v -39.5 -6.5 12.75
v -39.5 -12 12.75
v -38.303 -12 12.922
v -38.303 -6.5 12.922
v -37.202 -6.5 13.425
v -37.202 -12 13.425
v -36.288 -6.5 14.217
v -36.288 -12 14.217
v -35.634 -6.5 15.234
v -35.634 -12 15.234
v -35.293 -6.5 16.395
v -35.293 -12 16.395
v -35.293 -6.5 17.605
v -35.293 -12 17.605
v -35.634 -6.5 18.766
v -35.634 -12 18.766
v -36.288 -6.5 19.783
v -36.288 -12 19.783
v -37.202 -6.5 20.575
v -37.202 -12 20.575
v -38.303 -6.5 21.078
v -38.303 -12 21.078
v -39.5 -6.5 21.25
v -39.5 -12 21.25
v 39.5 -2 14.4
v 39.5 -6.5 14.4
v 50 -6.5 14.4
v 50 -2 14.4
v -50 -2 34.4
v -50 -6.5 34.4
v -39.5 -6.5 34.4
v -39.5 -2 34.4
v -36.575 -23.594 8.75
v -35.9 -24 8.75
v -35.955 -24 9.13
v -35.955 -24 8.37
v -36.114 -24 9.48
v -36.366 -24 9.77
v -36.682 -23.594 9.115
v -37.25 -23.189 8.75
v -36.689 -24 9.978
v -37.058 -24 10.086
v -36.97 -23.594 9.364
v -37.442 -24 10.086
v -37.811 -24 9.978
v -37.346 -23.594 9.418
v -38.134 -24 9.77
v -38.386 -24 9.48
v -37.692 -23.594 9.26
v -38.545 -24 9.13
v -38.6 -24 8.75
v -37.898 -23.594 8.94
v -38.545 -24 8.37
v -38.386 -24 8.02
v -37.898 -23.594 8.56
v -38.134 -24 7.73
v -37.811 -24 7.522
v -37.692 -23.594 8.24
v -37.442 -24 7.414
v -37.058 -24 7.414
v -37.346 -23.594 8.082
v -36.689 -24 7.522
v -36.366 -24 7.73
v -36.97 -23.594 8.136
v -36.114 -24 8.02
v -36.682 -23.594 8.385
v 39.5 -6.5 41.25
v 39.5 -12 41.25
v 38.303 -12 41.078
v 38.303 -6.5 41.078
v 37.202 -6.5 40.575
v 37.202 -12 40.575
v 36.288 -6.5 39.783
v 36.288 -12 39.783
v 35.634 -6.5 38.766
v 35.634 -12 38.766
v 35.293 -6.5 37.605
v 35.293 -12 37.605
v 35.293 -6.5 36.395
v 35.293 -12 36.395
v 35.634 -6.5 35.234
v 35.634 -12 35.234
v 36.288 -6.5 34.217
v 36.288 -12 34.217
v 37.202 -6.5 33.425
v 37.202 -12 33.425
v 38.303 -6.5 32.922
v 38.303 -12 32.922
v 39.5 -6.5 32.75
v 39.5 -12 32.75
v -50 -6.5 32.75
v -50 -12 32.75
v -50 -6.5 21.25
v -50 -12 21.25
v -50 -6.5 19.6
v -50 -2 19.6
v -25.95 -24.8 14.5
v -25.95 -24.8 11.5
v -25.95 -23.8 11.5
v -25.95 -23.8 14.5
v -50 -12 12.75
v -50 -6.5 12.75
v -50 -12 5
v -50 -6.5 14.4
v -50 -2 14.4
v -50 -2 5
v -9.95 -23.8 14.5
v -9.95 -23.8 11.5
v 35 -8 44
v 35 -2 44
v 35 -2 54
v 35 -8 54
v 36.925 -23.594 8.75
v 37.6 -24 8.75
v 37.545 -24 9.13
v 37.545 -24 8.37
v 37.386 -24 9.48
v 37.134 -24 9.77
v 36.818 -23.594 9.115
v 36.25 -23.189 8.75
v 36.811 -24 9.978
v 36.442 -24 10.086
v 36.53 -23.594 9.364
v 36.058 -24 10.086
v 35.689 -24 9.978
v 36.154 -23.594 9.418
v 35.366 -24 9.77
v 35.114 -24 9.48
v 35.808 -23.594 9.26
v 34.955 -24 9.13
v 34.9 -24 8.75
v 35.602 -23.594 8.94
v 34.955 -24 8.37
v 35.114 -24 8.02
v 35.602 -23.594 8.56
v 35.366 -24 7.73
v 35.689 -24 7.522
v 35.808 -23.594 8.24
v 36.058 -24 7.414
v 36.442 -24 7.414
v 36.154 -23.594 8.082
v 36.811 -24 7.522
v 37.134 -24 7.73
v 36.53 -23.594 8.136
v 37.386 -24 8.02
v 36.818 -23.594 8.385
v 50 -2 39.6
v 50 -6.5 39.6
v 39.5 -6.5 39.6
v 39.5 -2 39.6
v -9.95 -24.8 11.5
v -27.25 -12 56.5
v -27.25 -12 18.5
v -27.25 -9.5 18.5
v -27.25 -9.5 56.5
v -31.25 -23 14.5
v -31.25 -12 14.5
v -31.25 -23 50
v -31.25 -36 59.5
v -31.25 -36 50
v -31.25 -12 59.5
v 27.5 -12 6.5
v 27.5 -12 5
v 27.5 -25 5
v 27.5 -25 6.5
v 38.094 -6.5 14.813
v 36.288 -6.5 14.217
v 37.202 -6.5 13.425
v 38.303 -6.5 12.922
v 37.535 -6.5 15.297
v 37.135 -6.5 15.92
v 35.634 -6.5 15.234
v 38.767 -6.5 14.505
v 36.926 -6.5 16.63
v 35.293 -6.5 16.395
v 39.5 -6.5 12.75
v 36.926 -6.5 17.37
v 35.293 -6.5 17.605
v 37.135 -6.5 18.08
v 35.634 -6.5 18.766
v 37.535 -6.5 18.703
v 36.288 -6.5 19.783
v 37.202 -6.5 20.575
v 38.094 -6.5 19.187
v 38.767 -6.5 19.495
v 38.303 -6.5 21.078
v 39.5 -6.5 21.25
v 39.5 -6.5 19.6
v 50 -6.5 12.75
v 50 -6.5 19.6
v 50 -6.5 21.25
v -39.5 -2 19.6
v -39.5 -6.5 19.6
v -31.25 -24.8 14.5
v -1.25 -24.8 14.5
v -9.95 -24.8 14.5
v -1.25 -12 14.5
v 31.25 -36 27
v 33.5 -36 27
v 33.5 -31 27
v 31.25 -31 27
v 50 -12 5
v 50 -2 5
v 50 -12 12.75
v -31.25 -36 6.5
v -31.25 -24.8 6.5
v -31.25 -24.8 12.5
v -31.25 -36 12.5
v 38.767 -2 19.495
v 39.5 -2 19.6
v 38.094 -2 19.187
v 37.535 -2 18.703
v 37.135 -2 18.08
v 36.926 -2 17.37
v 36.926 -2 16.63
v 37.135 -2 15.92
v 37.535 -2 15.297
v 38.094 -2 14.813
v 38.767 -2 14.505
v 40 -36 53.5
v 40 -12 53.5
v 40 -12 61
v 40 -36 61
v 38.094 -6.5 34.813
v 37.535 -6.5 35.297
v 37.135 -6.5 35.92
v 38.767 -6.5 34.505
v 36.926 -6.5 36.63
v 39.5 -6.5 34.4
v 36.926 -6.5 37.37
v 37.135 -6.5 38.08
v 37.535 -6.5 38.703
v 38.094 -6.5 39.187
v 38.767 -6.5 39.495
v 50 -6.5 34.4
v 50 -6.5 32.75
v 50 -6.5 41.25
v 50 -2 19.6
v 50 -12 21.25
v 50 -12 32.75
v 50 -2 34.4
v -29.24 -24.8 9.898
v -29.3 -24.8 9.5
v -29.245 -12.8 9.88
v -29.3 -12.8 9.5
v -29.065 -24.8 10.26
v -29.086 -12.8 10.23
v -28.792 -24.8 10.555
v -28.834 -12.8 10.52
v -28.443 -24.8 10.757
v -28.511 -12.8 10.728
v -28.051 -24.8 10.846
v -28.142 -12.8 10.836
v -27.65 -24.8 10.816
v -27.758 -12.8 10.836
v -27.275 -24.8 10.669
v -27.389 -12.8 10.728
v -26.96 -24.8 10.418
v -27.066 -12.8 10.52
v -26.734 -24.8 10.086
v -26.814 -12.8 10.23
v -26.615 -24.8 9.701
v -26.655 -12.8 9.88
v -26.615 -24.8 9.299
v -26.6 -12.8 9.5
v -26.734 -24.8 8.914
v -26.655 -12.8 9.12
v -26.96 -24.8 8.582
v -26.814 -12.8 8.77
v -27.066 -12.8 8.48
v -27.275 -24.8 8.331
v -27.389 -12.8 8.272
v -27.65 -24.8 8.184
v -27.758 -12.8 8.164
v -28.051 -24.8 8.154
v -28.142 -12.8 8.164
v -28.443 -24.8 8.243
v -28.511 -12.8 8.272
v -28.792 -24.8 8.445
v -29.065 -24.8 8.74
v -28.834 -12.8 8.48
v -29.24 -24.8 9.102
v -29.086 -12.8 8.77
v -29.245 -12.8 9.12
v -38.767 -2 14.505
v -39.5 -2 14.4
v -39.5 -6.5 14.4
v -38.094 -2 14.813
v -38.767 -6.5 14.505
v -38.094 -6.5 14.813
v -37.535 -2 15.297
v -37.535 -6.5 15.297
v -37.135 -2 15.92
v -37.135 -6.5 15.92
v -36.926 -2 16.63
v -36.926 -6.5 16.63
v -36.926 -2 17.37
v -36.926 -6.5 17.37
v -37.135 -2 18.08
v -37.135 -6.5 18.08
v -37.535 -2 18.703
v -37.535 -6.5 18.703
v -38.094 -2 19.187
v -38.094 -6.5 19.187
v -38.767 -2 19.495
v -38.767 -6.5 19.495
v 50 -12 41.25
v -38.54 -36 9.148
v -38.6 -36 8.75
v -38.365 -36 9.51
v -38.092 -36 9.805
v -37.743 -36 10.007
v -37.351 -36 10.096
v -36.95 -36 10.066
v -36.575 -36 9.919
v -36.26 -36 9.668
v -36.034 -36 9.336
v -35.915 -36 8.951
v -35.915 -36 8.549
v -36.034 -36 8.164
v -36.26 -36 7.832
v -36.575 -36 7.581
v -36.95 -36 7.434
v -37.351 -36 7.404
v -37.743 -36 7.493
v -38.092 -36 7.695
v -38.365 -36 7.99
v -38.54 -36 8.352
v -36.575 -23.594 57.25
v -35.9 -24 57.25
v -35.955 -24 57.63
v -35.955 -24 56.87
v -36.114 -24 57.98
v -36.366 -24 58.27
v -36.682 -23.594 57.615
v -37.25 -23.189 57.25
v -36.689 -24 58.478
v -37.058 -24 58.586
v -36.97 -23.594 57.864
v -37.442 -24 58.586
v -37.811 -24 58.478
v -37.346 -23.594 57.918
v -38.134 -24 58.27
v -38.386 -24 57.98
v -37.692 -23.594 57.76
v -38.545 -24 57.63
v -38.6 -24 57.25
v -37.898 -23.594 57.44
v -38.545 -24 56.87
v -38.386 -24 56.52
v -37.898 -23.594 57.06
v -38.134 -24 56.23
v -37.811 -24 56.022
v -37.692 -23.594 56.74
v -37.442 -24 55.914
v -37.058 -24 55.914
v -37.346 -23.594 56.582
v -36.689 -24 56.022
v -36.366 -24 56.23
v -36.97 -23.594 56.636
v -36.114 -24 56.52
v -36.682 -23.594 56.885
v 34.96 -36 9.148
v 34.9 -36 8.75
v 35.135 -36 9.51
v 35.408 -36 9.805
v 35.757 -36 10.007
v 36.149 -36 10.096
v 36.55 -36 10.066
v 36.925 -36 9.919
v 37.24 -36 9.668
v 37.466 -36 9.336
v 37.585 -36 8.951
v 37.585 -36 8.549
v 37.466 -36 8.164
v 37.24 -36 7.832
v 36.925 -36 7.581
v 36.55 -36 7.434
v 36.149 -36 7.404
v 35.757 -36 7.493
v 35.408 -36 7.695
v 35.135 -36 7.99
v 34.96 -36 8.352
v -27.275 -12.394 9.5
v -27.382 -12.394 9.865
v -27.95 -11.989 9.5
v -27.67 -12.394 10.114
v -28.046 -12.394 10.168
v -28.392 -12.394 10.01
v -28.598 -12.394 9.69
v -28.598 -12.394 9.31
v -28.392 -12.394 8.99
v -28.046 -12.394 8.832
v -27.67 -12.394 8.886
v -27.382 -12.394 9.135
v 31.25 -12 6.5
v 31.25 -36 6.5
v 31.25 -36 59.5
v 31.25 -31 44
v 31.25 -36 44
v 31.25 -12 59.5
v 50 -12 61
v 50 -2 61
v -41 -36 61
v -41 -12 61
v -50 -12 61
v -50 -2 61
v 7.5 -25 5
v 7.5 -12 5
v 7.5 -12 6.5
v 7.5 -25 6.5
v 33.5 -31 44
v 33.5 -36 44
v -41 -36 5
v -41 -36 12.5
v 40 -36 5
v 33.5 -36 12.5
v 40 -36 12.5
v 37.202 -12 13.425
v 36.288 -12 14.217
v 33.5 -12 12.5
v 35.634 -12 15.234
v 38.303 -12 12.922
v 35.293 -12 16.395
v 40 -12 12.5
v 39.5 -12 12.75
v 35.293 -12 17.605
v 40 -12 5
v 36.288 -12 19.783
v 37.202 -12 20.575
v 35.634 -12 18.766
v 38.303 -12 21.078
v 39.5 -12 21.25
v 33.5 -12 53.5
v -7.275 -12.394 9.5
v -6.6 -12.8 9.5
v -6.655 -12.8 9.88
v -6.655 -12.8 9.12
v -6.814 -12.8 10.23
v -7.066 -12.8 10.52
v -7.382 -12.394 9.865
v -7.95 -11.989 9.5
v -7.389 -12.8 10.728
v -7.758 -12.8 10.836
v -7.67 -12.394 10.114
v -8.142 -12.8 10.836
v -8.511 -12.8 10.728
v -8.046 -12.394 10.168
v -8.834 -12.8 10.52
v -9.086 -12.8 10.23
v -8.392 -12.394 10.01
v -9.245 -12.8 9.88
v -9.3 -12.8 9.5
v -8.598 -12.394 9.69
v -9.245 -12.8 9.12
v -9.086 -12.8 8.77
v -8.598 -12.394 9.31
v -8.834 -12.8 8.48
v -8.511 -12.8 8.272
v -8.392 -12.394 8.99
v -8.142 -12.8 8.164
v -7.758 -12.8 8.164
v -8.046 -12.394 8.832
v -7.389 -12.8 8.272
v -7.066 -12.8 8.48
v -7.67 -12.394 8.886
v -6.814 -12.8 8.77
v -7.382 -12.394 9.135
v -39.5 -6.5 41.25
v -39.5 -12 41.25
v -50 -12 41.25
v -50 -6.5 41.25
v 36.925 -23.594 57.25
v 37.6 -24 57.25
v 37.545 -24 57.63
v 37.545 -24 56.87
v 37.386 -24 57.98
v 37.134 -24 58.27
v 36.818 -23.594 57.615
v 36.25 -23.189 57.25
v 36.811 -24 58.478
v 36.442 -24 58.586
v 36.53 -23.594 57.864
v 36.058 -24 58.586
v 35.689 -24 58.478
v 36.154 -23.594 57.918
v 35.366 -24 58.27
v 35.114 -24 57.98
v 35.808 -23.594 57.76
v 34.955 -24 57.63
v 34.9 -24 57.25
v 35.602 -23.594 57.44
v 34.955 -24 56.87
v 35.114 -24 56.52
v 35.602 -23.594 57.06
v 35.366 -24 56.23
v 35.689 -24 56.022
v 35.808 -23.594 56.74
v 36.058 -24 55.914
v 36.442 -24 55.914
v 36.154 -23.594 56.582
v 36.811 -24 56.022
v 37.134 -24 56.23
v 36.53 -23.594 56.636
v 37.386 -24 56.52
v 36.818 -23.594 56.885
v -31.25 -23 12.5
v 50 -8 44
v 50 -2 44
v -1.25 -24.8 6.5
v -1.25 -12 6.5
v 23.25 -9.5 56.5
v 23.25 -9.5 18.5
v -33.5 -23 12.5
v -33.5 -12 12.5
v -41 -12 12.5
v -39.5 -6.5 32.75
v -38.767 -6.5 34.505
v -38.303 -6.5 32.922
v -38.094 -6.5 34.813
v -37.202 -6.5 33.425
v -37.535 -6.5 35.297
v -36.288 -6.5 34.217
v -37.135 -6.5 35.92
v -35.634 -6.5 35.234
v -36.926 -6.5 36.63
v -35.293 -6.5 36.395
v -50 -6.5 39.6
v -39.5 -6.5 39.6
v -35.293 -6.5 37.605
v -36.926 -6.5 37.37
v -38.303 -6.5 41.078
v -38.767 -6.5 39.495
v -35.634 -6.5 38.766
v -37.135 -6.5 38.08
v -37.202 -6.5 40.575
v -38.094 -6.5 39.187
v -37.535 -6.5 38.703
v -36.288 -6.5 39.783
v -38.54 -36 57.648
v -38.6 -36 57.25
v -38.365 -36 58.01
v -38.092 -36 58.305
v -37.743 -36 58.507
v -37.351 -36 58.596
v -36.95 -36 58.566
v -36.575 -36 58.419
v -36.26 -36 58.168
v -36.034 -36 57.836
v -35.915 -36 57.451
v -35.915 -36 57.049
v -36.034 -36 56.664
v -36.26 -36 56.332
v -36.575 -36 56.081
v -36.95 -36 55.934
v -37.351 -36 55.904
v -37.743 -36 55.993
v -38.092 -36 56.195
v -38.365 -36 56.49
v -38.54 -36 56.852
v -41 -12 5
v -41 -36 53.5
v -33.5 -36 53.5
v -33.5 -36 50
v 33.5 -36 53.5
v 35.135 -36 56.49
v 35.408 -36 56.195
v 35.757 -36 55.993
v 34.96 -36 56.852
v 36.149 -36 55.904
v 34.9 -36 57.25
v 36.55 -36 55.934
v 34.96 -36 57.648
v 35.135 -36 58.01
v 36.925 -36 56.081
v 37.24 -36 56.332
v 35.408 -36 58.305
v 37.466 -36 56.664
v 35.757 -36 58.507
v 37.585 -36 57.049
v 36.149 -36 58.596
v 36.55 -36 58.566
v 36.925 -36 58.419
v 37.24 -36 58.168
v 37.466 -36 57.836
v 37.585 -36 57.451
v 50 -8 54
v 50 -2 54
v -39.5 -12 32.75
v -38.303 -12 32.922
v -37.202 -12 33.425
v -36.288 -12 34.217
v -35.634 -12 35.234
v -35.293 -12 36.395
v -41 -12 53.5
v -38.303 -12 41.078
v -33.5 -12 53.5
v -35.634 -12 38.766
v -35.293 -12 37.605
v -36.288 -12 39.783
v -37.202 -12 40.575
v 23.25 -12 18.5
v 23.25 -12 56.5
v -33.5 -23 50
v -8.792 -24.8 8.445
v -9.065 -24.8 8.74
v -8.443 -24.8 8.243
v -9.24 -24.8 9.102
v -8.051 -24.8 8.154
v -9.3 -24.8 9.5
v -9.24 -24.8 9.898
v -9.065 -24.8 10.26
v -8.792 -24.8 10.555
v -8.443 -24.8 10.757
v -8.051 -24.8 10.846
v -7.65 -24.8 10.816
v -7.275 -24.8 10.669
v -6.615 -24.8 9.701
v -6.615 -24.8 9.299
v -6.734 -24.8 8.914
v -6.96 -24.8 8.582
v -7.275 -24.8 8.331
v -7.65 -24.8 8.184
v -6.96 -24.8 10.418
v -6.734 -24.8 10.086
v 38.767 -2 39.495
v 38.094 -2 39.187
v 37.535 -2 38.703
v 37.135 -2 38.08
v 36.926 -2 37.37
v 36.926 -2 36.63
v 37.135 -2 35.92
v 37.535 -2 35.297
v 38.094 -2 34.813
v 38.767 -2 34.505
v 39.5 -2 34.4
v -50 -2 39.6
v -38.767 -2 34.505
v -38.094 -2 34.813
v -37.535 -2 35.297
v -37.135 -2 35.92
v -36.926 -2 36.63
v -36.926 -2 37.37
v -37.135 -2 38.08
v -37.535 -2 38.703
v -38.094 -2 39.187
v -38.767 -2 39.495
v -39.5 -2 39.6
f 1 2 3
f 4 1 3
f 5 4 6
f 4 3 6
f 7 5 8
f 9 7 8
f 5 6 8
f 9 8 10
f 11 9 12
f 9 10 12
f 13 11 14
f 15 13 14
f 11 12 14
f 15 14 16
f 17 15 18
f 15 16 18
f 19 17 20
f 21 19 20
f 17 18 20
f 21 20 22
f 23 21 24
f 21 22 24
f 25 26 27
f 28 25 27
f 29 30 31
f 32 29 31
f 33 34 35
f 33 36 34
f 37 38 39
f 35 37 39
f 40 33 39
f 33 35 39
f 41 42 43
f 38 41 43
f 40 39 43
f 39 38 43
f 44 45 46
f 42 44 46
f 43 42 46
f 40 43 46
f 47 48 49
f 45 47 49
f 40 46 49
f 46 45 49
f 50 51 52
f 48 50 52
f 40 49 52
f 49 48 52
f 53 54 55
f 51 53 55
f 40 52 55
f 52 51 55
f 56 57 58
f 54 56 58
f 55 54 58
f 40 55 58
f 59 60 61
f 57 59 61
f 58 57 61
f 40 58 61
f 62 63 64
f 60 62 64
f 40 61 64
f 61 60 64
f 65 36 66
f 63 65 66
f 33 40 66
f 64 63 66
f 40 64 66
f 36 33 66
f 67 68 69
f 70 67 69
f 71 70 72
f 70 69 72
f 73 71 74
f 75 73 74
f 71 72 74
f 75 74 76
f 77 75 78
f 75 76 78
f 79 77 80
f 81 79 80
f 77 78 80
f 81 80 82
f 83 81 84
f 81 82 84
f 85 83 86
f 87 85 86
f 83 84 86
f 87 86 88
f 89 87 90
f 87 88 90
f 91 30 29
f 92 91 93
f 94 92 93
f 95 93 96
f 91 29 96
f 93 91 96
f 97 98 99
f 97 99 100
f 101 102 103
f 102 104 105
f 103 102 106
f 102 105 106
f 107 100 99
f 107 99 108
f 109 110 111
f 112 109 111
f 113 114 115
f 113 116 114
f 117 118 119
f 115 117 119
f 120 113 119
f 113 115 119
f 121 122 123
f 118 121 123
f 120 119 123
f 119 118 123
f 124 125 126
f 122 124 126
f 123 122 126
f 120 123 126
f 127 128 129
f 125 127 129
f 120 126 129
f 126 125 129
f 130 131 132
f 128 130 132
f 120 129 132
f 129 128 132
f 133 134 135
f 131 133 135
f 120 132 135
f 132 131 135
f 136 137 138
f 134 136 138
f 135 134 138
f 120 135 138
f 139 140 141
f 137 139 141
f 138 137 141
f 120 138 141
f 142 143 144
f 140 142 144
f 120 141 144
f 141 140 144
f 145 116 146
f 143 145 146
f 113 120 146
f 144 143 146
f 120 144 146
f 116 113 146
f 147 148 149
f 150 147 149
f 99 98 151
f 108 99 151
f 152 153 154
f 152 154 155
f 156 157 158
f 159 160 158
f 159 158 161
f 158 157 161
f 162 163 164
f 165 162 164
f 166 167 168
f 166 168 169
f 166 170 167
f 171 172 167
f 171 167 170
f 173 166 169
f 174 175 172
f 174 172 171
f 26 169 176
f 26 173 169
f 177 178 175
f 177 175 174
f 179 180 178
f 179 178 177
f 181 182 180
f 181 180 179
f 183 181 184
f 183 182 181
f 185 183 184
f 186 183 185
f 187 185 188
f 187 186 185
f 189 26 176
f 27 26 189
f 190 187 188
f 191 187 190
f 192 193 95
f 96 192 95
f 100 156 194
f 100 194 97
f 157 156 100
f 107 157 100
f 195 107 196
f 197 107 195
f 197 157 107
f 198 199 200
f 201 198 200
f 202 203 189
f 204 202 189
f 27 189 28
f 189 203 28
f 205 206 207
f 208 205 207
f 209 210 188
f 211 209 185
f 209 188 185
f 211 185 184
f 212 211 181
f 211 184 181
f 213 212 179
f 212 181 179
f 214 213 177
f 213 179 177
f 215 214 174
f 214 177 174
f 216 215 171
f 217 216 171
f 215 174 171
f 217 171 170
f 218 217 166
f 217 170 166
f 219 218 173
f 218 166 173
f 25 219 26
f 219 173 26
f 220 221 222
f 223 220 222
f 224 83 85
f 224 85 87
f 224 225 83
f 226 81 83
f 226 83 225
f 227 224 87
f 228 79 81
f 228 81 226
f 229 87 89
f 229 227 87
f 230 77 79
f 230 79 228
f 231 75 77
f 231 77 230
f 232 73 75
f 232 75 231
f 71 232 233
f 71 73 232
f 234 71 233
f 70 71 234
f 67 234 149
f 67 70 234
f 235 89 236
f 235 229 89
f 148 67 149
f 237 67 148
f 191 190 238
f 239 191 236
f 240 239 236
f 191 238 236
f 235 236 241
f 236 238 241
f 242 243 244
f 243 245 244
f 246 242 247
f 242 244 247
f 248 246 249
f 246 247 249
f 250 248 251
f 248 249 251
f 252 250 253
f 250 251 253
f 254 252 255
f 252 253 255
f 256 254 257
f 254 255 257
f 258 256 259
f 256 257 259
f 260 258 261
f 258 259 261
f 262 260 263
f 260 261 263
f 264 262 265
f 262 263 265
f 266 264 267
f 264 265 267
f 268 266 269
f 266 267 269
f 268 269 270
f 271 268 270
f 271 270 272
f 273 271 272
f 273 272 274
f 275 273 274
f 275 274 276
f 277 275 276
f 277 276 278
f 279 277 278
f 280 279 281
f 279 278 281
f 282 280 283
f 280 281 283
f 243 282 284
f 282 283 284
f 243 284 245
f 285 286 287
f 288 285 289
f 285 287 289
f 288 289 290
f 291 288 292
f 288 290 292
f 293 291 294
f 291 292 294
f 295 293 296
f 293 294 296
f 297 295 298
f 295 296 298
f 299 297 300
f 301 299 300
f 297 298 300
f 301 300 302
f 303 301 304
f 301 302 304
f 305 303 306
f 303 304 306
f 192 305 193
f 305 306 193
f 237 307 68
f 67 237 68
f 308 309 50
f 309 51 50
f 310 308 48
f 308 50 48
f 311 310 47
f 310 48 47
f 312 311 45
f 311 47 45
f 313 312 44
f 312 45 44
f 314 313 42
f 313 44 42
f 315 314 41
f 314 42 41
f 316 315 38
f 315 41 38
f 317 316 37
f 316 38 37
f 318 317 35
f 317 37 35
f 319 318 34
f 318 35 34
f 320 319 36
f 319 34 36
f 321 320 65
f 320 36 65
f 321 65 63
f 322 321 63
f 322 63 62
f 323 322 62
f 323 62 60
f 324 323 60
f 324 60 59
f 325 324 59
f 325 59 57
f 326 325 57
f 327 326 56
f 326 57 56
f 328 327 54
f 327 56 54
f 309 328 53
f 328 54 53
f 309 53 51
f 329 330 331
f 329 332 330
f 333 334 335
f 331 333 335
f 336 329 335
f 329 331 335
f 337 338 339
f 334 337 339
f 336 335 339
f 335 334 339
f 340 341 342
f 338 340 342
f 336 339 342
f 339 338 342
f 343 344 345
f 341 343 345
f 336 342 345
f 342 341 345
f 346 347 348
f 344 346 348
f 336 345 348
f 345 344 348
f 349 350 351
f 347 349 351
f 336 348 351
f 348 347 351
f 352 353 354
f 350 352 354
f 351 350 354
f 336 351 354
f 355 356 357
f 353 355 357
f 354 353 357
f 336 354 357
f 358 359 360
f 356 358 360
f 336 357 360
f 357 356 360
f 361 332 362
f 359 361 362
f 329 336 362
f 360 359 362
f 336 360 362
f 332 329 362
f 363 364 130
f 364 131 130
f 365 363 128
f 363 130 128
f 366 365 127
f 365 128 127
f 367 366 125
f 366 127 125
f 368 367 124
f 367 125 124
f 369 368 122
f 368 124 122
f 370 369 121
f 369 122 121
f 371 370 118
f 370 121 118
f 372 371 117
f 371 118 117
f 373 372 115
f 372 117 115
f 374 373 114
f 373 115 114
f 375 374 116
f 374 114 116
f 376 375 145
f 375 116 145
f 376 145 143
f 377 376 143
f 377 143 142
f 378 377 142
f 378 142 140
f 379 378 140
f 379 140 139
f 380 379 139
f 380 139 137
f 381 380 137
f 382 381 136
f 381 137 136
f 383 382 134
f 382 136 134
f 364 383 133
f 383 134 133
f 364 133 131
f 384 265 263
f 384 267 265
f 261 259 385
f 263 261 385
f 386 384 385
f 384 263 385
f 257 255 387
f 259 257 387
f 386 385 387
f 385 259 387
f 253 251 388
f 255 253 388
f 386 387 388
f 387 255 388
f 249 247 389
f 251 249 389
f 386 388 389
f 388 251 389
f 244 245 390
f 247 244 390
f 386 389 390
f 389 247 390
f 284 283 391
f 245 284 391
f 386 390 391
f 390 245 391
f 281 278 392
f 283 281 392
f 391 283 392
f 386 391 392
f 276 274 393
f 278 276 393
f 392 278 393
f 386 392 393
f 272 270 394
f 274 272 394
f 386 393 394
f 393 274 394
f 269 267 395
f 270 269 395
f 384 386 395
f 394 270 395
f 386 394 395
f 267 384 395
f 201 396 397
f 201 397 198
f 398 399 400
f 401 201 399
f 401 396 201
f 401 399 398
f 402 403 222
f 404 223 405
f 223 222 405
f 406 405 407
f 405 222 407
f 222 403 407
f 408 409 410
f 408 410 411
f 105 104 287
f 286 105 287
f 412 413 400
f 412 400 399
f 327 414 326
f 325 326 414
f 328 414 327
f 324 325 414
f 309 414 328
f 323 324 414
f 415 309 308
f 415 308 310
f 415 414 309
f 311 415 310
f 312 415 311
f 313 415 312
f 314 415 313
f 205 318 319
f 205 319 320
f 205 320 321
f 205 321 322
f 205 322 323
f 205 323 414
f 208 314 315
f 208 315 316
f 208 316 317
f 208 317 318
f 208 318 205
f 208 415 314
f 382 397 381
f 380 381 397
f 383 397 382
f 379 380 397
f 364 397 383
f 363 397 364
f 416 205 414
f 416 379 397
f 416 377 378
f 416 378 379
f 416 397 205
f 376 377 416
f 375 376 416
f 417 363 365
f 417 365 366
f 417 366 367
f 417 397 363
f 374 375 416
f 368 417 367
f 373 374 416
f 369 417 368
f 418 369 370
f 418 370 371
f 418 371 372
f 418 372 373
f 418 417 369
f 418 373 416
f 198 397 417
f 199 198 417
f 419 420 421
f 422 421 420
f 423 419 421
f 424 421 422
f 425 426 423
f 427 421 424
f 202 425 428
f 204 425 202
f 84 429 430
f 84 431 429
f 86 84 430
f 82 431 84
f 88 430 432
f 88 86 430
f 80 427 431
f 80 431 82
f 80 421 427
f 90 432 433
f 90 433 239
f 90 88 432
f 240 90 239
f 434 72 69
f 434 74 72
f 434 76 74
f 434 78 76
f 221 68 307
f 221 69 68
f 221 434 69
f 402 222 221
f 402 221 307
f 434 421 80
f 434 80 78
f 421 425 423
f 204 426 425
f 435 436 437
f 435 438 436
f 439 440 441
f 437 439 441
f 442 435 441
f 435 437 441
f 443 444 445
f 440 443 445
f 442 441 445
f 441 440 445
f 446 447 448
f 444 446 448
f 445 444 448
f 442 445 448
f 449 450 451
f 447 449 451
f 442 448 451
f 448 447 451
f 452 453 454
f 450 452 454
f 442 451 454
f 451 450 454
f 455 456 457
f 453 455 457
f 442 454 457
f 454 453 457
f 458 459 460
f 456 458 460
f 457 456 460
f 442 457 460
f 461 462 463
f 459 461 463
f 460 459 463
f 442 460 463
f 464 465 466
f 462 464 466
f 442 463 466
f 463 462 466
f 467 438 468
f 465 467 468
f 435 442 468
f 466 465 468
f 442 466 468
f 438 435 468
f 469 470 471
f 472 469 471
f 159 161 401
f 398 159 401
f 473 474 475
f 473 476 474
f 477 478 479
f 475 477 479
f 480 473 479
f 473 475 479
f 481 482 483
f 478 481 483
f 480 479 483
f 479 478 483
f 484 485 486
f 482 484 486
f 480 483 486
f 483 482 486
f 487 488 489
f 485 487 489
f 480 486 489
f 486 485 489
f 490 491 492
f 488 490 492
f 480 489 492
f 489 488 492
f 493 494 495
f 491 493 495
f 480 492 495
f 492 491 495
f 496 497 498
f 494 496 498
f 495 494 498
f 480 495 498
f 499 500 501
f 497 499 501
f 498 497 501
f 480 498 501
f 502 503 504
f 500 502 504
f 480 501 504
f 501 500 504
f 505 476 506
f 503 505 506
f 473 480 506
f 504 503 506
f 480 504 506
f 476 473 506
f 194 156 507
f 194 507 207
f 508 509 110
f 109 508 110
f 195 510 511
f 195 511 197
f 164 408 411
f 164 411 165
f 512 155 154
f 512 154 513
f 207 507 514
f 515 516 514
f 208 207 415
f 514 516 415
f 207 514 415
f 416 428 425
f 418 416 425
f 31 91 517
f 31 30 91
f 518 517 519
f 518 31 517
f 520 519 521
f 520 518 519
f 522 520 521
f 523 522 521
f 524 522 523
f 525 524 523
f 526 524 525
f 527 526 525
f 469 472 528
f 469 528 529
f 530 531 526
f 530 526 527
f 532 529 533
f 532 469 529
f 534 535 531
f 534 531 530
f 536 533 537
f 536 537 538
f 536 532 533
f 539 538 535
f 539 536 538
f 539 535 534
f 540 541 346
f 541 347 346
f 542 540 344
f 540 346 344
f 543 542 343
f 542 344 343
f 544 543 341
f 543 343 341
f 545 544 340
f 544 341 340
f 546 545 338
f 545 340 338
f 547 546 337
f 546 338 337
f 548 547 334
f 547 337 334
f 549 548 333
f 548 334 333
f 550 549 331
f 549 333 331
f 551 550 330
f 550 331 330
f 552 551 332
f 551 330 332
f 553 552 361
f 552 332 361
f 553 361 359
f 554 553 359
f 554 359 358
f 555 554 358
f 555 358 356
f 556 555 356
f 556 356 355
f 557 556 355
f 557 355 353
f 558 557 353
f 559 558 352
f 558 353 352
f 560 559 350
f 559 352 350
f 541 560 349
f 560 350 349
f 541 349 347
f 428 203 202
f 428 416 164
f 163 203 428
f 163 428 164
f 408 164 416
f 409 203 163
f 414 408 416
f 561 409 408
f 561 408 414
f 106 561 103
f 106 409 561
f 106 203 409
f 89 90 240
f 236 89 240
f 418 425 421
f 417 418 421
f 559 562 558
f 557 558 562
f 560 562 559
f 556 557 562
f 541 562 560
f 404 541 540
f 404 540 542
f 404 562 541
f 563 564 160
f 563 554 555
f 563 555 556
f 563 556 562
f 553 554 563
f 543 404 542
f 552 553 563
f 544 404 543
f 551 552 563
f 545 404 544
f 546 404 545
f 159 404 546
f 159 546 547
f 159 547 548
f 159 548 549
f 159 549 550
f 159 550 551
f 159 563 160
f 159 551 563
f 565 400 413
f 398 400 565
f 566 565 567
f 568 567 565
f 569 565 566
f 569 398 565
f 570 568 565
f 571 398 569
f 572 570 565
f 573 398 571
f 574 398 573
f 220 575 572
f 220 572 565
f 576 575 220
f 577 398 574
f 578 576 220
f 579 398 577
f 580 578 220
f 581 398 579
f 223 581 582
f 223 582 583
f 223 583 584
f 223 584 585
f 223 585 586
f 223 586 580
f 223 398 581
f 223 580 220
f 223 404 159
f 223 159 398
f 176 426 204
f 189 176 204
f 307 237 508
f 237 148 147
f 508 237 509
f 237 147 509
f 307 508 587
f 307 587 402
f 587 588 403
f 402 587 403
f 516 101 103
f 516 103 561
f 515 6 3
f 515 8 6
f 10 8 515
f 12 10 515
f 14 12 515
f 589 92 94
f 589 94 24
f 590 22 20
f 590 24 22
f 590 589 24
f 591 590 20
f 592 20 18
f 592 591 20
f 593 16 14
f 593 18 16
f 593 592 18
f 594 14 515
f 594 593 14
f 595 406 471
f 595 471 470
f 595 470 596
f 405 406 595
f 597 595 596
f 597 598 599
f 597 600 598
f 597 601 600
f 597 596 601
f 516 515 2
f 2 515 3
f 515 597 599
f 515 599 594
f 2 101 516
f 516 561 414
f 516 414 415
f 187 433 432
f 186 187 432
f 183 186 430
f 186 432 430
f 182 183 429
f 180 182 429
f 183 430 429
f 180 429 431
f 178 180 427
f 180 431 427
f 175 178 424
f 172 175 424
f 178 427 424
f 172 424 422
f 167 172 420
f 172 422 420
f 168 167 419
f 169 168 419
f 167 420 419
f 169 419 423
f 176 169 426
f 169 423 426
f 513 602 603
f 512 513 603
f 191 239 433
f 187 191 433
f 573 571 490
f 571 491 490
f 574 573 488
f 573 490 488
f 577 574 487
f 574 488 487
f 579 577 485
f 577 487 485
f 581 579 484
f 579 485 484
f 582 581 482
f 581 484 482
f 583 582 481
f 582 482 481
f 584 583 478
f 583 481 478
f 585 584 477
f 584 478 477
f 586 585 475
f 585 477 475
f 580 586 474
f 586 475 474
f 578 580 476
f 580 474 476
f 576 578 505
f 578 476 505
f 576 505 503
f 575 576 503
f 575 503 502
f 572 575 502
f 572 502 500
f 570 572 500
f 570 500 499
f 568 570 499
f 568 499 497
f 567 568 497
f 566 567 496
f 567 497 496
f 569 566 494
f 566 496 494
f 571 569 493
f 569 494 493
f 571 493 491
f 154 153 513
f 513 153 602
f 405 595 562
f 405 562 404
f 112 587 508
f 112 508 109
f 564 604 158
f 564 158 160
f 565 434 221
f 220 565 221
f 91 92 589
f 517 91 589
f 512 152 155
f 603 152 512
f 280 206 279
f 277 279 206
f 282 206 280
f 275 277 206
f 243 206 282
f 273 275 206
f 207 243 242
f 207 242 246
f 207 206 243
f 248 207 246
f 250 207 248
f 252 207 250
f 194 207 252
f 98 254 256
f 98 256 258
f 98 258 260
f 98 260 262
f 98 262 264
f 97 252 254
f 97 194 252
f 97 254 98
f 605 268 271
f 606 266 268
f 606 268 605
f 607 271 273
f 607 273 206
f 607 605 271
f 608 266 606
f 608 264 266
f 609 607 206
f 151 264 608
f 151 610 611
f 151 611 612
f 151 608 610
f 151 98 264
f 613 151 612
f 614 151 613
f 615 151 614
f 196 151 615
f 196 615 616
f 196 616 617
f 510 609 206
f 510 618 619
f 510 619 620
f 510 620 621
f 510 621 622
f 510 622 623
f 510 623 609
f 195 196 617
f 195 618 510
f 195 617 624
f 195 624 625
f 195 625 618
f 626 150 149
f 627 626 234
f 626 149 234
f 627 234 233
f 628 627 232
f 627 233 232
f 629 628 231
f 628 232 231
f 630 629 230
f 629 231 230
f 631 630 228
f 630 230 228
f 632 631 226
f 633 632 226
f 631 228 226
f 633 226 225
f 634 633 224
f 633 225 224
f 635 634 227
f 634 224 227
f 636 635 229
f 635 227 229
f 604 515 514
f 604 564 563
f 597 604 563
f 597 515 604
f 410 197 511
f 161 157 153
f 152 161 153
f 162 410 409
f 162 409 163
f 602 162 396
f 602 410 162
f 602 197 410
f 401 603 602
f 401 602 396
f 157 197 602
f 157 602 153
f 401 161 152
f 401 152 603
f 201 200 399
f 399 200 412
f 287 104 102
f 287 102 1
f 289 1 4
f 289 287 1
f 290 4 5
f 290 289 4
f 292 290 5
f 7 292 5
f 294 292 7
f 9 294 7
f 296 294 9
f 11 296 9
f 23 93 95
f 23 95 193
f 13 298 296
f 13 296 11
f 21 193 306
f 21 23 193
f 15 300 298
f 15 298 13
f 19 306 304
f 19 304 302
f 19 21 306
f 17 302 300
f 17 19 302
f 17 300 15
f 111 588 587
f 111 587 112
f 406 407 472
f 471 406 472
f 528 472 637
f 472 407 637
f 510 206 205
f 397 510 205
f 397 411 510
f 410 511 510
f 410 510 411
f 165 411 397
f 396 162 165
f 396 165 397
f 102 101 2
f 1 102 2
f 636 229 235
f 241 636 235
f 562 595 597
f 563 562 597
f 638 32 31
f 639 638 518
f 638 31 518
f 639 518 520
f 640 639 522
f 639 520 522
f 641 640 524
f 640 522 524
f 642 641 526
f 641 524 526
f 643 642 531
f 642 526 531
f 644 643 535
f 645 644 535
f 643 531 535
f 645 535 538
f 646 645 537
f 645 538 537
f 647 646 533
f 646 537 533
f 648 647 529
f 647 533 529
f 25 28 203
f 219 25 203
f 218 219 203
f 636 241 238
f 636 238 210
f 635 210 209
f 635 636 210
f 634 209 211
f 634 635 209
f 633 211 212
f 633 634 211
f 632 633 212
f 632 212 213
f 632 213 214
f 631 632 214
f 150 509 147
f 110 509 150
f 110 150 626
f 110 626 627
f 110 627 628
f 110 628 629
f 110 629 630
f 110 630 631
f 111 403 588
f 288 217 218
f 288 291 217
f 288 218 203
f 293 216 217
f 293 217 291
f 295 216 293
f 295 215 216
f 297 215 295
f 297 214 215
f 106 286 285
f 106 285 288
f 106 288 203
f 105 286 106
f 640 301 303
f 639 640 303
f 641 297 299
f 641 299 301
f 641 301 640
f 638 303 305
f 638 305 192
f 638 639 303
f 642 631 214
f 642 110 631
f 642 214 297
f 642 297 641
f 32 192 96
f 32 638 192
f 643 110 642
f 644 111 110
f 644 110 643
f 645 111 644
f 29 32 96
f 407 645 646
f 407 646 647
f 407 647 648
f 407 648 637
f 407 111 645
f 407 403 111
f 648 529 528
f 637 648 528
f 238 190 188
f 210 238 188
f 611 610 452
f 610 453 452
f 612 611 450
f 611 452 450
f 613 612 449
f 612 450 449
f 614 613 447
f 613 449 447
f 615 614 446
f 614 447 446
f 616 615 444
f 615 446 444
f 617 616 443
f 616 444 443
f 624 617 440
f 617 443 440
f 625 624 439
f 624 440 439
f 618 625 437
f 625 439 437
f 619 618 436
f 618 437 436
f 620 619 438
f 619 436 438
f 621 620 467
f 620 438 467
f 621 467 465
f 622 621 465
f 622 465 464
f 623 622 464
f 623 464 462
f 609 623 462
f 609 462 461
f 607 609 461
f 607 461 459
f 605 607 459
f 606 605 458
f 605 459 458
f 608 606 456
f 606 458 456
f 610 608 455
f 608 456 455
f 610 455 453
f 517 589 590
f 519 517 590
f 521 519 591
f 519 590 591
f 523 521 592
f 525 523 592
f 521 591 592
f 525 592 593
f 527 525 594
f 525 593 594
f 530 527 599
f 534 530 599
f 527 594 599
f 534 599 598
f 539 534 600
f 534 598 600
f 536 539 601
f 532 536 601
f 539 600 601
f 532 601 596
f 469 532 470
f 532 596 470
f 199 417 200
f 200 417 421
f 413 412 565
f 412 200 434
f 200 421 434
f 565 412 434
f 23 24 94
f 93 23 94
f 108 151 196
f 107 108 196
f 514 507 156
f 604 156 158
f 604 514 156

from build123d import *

# Parameters (mm, degrees)
F1_DEPTH  = 12
F3_DEPTH  = 5
F4_W      = 100
F4_H      = 56
F5_DEPTH  = 2
F6_W      = 130
F6_H      = 5
F7_DEPTH  = 12.001
F9_DEPTH  = 10.001
F11_DEPTH = 5.5
F12_W     = 67
F12_H     = 56
F12_W_2   = 62.5
F12_H_2   = 53
F13_DEPTH = 24
F14_W     = 30
F14_H     = 8
F15_DEPTH = 12.8
F16_W     = 13
F16_H     = 37.5
F17_DEPTH = 2.25
F18_W     = 20
F18_H     = 13
F19_DEPTH = 1.5
F21_D     = 2.7
F21_DEPTH = 12
F21_TIP   = 0.8111618357
F22_W     = 50.5
F22_H     = 38
F23_DEPTH = 2.5
F24_W     = 6.5
F24_H     = 7.5
F24_W_2   = 1
F24_W_3   = 7.5
F25_DEPTH = 24
F27_D     = 2.7
F27_DEPTH = 12
F27_TIP   = 0.8111618357
F28_W     = 5
F28_H     = 17
F29_DEPTH = 2.25
F30_W     = 15
F30_H     = 10
F31_DEPTH = 6
F32_W     = 16
F32_H     = 3
F33_DEPTH = 1


# Not quite as in the source:
# - a feature names something its author has since deleted; it is built from what else it names


with BuildPart() as f1:
    # F0 (on Front) → F1 (new body)
    with BuildSketch(Plane.XZ):
        Polygon((-65, 5), (-65, 0), (65, 0), (65, 5), (50, 5), (50, 61), (-50, 61), (-50, 5), align=None)
    extrude(amount=F1_DEPTH)

    # F2 (on face) → F3 (cut, through all)
    with BuildSketch(Plane(origin=(0, 0, 0), x_dir=(1, 0, 0), z_dir=(0, 0, -1))):
        with BuildLine():
            Line((-65, 2.65), (-63, 2.65))
            ThreePointArc((-63, 2.65), (-59.65, 6), (-63, 9.35))
            Line((-63, 9.35), (-65, 9.35))
            Line((-65, 9.35), (-65, 2.65))
        make_face()
        with BuildLine():
            Line((65, 9.35), (63, 9.35))
            ThreePointArc((63, 9.35), (59.65, 6), (63, 2.65))
            Line((63, 2.65), (65, 2.65))
            Line((65, 2.65), (65, 9.35))
        make_face()
    extrude(amount=-F3_DEPTH, mode=Mode.SUBTRACT)

    # F4 (on face) → F5 (cut)
    with BuildSketch(Plane(origin=(0, 0, 0), x_dir=(-1, 0, 0), z_dir=(0, 1, 0))):
        with Locations((0, 33)):
            Rectangle(F4_W, F4_H)
    extrude(amount=-F5_DEPTH, mode=Mode.SUBTRACT)

    # F6 (on face) → F7 (cut, through all)
    with BuildSketch(Plane(origin=(0, 0, 0), x_dir=(-1, 0, 0), z_dir=(0, 1, 0))):
        with Locations((0, 2.5)):
            Rectangle(F6_W, F6_H)
    extrude(amount=-F7_DEPTH, mode=Mode.SUBTRACT)

    # F8 (on face) → F9 (cut, through all)
    with BuildSketch(Plane.XZ.offset(12)):
        with BuildLine():
            ThreePointArc((-39.5, 34.4), (-36.9, 37), (-39.5, 39.6))
            Line((-39.5, 39.6), (-50, 39.6))
            Line((-50, 39.6), (-50, 34.4))
            Line((-50, 34.4), (-39.5, 34.4))
        make_face()
        with BuildLine():
            Line((-39.5, 19.6), (-50, 19.6))
            Line((-50, 19.6), (-50, 14.4))
            Line((-50, 14.4), (-39.5, 14.4))
            ThreePointArc((-39.5, 14.4), (-36.9, 17), (-39.5, 19.6))
        make_face()
        with BuildLine():
            Line((50, 39.6), (39.5, 39.6))
            ThreePointArc((39.5, 39.6), (36.9, 37), (39.5, 34.4))
            Line((39.5, 34.4), (50, 34.4))
            Line((50, 34.4), (50, 39.6))
        make_face()
        with BuildLine():
            Line((50, 14.4), (50, 19.6))
            Line((50, 19.6), (39.5, 19.6))
            ThreePointArc((39.5, 19.6), (36.9, 17), (39.5, 14.4))
            Line((39.5, 14.4), (50, 14.4))
        make_face()
    extrude(amount=-F9_DEPTH, mode=Mode.SUBTRACT)

    # F10 (on face) → F11 (cut)
    with BuildSketch(Plane.XZ.offset(12)):
        with BuildLine():
            Line((-50, 32.75), (-39.5, 32.75))
            ThreePointArc((-39.5, 32.75), (-35.25, 37), (-39.5, 41.25))
            Line((-39.5, 41.25), (-50, 41.25))
            Line((-50, 41.25), (-50, 39.6))
            Line((-50, 39.6), (-39.5, 39.6))
            ThreePointArc((-39.5, 39.6), (-36.9, 37), (-39.5, 34.4))
            Line((-39.5, 34.4), (-50, 34.4))
            Line((-50, 34.4), (-50, 32.75))
        make_face()
        with BuildLine():
            Line((-39.5, 21.25), (-50, 21.25))
            Line((-50, 21.25), (-50, 19.6))
            Line((-50, 19.6), (-39.5, 19.6))
            ThreePointArc((-39.5, 19.6), (-36.9, 17), (-39.5, 14.4))
            Line((-39.5, 14.4), (-50, 14.4))
            Line((-50, 14.4), (-50, 12.75))
            Line((-50, 12.75), (-39.5, 12.75))
            ThreePointArc((-39.5, 12.75), (-35.25, 17), (-39.5, 21.25))
        make_face()
        with BuildLine():
            Line((50, 39.6), (50, 41.25))
            Line((50, 41.25), (39.5, 41.25))
            ThreePointArc((39.5, 41.25), (35.25, 37), (39.5, 32.75))
            Line((39.5, 32.75), (50, 32.75))
            Line((50, 32.75), (50, 34.4))
            Line((50, 34.4), (39.5, 34.4))
            ThreePointArc((39.5, 34.4), (36.9, 37), (39.5, 39.6))
            Line((39.5, 39.6), (50, 39.6))
        make_face()
        with BuildLine():
            Line((39.5, 12.75), (50, 12.75))
            Line((50, 12.75), (50, 14.4))
            Line((50, 14.4), (39.5, 14.4))
            ThreePointArc((39.5, 14.4), (36.9, 17), (39.5, 19.6))
            Line((39.5, 19.6), (50, 19.6))
            Line((50, 19.6), (50, 21.25))
            Line((50, 21.25), (39.5, 21.25))
            ThreePointArc((39.5, 21.25), (35.25, 17), (39.5, 12.75))
        make_face()
    extrude(amount=-F11_DEPTH, mode=Mode.SUBTRACT)

    # F12 (on face) → F13 (join)
    with BuildSketch(Plane.XZ.offset(12)):
        with Locations((0, 33)):
            Rectangle(F12_W, F12_H)
        with Locations((0, 33)):
            Rectangle(F12_W_2, F12_H_2, mode=Mode.SUBTRACT)
    extrude(amount=F13_DEPTH)

    # F14 (on face) → F15 (join)
    with BuildSketch(Plane.XZ.offset(12)):
        with Locations((-16.25, 10.5)):
            Rectangle(F14_W, F14_H)
    extrude(amount=F15_DEPTH)

    # F16 (on face) → F17 (cut, through all)
    with BuildSketch(Plane(origin=(-33.5, 0, 0), x_dir=(0, -1, 0), z_dir=(-1, 0, 0))):
        with Locations((29.5, 31.25)):
            Rectangle(F16_W, F16_H)
    extrude(amount=-F17_DEPTH, mode=Mode.SUBTRACT)

    # F18 (on face) → F19 (cut, through all)
    with BuildSketch(Plane(origin=(0, 0, 5), x_dir=(1, 0, 0), z_dir=(0, 0, -1))):
        with Locations((17.5, 18.5)):
            Rectangle(F18_W, F18_H)
    extrude(amount=-F19_DEPTH, mode=Mode.SUBTRACT)

    # F21
    with Locations(Plane.XZ.offset(24.8)):
        with Locations((-27.95, 9.5), (-7.95, 9.5)):
            Hole(F21_D / 2, depth=F21_DEPTH)
            with Locations((0, 0, -(F21_DEPTH + F21_TIP / 2))):  # 118° drill point
                Cone(0, F21_D / 2, F21_TIP, mode=Mode.SUBTRACT)

    # F22 (on face) → F23 (cut)
    with BuildSketch(Plane.XZ.offset(12)):
        with Locations((-2, 37.5)):
            Rectangle(F22_W, F22_H)
    extrude(amount=-F23_DEPTH, mode=Mode.SUBTRACT)

    # F24 (on face) → F25 (join, through all)
    with BuildSketch(Plane.XZ.offset(12)):
        with Locations((36.75, 57.25)):
            Rectangle(F24_W, F24_H)
        with Locations((33, 57.25)):
            Rectangle(F24_W_2, F24_H)
        with Locations((36.75, 8.75)):
            Rectangle(F24_W, F24_H)
        with Locations((33, 8.75)):
            Rectangle(F24_W_2, F24_H)
        with Locations((-37.25, 8.75)):
            Rectangle(F24_W_3, F24_H)
        with Locations((-37.25, 57.25)):
            Rectangle(F24_W_3, F24_H)
    extrude(amount=F25_DEPTH)

    # F27
    with Locations(Plane.XZ.offset(36)):
        with Locations((36.25, 57.25), (36.25, 8.75), (-37.25, 8.75), (-37.25, 57.25)):
            Hole(F27_D / 2, depth=F27_DEPTH)
            with Locations((0, 0, -(F27_DEPTH + F27_TIP / 2))):  # 118° drill point
                Cone(0, F27_D / 2, F27_TIP, mode=Mode.SUBTRACT)

    # F28 (on face) → F29 (cut, through all)
    with BuildSketch(Plane.YZ.offset(33.5)):
        with Locations((-33.5, 35.5)):
            Rectangle(F28_W, F28_H)
    extrude(amount=-F29_DEPTH, mode=Mode.SUBTRACT)

    # F30 (on face) → F31 (cut)
    with BuildSketch(Plane(origin=(0, -2, 0), x_dir=(-1, 0, 0), z_dir=(0, 1, 0))):
        with Locations((-42.5, 49)):
            Rectangle(F30_W, F30_H)
    extrude(amount=-F31_DEPTH, mode=Mode.SUBTRACT)

    # F32 (on face) → F33 (cut)
    with BuildSketch(Plane.XZ.offset(24.8)):
        with Locations((-17.95, 13)):
            Rectangle(F32_W, F32_H)
    extrude(amount=-F33_DEPTH, mode=Mode.SUBTRACT)


solid = f1.part
